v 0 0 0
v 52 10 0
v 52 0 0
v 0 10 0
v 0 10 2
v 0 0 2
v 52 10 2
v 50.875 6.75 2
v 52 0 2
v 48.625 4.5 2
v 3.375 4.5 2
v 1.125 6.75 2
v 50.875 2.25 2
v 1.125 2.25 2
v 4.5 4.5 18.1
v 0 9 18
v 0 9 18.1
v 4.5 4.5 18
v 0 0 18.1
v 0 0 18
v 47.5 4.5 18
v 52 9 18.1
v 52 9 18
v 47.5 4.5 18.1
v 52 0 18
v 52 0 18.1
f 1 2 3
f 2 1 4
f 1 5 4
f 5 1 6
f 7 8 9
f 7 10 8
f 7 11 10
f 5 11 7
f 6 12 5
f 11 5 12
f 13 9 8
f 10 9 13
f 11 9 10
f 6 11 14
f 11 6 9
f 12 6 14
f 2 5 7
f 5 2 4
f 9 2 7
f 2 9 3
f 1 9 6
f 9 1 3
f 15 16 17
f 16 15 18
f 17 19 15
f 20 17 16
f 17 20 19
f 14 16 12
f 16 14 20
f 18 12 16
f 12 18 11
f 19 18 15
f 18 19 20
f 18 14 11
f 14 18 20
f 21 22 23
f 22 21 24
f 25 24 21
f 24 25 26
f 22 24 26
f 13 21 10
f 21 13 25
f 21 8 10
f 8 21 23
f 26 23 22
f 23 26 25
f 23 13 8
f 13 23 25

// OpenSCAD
$topwidth=52;
$middlewidth=43;

$toptomiddley=5;
$xholder = ($topwidth-$middlewidth)/2;
$xsmall = $xholder / 2;

$depth = 16;

$thickness = 2;

linear_extrude(height = $thickness)
square([$middlewidth+$xholder*2,$toptomiddley*2]);

translate([0,0,$thickness])
hull()
{
    translate([$xsmall/2,$xsmall,0])
    linear_extrude(height = 0.1)
    polygon([[0,0],[$xsmall,$xsmall],[0,$xholder]]);

    translate([0,0,$depth])
    linear_extrude(height = 0.1)
    polygon([[0,0],[$xholder,$xholder],[0,$xholder*2]]);
}

translate([$middlewidth+$xholder,0,$thickness])
hull()
{
    translate([$xsmall/2,$xsmall,0])
    linear_extrude(height = 0.1)
    polygon([[0,$xsmall],[$xsmall,0],[$xsmall,$xholder]]);

    translate([0,0,$depth])
    linear_extrude(height = 0.1)
    polygon([[0,$xholder],[$xholder,0],[$xholder,$xholder*2]]);
}
